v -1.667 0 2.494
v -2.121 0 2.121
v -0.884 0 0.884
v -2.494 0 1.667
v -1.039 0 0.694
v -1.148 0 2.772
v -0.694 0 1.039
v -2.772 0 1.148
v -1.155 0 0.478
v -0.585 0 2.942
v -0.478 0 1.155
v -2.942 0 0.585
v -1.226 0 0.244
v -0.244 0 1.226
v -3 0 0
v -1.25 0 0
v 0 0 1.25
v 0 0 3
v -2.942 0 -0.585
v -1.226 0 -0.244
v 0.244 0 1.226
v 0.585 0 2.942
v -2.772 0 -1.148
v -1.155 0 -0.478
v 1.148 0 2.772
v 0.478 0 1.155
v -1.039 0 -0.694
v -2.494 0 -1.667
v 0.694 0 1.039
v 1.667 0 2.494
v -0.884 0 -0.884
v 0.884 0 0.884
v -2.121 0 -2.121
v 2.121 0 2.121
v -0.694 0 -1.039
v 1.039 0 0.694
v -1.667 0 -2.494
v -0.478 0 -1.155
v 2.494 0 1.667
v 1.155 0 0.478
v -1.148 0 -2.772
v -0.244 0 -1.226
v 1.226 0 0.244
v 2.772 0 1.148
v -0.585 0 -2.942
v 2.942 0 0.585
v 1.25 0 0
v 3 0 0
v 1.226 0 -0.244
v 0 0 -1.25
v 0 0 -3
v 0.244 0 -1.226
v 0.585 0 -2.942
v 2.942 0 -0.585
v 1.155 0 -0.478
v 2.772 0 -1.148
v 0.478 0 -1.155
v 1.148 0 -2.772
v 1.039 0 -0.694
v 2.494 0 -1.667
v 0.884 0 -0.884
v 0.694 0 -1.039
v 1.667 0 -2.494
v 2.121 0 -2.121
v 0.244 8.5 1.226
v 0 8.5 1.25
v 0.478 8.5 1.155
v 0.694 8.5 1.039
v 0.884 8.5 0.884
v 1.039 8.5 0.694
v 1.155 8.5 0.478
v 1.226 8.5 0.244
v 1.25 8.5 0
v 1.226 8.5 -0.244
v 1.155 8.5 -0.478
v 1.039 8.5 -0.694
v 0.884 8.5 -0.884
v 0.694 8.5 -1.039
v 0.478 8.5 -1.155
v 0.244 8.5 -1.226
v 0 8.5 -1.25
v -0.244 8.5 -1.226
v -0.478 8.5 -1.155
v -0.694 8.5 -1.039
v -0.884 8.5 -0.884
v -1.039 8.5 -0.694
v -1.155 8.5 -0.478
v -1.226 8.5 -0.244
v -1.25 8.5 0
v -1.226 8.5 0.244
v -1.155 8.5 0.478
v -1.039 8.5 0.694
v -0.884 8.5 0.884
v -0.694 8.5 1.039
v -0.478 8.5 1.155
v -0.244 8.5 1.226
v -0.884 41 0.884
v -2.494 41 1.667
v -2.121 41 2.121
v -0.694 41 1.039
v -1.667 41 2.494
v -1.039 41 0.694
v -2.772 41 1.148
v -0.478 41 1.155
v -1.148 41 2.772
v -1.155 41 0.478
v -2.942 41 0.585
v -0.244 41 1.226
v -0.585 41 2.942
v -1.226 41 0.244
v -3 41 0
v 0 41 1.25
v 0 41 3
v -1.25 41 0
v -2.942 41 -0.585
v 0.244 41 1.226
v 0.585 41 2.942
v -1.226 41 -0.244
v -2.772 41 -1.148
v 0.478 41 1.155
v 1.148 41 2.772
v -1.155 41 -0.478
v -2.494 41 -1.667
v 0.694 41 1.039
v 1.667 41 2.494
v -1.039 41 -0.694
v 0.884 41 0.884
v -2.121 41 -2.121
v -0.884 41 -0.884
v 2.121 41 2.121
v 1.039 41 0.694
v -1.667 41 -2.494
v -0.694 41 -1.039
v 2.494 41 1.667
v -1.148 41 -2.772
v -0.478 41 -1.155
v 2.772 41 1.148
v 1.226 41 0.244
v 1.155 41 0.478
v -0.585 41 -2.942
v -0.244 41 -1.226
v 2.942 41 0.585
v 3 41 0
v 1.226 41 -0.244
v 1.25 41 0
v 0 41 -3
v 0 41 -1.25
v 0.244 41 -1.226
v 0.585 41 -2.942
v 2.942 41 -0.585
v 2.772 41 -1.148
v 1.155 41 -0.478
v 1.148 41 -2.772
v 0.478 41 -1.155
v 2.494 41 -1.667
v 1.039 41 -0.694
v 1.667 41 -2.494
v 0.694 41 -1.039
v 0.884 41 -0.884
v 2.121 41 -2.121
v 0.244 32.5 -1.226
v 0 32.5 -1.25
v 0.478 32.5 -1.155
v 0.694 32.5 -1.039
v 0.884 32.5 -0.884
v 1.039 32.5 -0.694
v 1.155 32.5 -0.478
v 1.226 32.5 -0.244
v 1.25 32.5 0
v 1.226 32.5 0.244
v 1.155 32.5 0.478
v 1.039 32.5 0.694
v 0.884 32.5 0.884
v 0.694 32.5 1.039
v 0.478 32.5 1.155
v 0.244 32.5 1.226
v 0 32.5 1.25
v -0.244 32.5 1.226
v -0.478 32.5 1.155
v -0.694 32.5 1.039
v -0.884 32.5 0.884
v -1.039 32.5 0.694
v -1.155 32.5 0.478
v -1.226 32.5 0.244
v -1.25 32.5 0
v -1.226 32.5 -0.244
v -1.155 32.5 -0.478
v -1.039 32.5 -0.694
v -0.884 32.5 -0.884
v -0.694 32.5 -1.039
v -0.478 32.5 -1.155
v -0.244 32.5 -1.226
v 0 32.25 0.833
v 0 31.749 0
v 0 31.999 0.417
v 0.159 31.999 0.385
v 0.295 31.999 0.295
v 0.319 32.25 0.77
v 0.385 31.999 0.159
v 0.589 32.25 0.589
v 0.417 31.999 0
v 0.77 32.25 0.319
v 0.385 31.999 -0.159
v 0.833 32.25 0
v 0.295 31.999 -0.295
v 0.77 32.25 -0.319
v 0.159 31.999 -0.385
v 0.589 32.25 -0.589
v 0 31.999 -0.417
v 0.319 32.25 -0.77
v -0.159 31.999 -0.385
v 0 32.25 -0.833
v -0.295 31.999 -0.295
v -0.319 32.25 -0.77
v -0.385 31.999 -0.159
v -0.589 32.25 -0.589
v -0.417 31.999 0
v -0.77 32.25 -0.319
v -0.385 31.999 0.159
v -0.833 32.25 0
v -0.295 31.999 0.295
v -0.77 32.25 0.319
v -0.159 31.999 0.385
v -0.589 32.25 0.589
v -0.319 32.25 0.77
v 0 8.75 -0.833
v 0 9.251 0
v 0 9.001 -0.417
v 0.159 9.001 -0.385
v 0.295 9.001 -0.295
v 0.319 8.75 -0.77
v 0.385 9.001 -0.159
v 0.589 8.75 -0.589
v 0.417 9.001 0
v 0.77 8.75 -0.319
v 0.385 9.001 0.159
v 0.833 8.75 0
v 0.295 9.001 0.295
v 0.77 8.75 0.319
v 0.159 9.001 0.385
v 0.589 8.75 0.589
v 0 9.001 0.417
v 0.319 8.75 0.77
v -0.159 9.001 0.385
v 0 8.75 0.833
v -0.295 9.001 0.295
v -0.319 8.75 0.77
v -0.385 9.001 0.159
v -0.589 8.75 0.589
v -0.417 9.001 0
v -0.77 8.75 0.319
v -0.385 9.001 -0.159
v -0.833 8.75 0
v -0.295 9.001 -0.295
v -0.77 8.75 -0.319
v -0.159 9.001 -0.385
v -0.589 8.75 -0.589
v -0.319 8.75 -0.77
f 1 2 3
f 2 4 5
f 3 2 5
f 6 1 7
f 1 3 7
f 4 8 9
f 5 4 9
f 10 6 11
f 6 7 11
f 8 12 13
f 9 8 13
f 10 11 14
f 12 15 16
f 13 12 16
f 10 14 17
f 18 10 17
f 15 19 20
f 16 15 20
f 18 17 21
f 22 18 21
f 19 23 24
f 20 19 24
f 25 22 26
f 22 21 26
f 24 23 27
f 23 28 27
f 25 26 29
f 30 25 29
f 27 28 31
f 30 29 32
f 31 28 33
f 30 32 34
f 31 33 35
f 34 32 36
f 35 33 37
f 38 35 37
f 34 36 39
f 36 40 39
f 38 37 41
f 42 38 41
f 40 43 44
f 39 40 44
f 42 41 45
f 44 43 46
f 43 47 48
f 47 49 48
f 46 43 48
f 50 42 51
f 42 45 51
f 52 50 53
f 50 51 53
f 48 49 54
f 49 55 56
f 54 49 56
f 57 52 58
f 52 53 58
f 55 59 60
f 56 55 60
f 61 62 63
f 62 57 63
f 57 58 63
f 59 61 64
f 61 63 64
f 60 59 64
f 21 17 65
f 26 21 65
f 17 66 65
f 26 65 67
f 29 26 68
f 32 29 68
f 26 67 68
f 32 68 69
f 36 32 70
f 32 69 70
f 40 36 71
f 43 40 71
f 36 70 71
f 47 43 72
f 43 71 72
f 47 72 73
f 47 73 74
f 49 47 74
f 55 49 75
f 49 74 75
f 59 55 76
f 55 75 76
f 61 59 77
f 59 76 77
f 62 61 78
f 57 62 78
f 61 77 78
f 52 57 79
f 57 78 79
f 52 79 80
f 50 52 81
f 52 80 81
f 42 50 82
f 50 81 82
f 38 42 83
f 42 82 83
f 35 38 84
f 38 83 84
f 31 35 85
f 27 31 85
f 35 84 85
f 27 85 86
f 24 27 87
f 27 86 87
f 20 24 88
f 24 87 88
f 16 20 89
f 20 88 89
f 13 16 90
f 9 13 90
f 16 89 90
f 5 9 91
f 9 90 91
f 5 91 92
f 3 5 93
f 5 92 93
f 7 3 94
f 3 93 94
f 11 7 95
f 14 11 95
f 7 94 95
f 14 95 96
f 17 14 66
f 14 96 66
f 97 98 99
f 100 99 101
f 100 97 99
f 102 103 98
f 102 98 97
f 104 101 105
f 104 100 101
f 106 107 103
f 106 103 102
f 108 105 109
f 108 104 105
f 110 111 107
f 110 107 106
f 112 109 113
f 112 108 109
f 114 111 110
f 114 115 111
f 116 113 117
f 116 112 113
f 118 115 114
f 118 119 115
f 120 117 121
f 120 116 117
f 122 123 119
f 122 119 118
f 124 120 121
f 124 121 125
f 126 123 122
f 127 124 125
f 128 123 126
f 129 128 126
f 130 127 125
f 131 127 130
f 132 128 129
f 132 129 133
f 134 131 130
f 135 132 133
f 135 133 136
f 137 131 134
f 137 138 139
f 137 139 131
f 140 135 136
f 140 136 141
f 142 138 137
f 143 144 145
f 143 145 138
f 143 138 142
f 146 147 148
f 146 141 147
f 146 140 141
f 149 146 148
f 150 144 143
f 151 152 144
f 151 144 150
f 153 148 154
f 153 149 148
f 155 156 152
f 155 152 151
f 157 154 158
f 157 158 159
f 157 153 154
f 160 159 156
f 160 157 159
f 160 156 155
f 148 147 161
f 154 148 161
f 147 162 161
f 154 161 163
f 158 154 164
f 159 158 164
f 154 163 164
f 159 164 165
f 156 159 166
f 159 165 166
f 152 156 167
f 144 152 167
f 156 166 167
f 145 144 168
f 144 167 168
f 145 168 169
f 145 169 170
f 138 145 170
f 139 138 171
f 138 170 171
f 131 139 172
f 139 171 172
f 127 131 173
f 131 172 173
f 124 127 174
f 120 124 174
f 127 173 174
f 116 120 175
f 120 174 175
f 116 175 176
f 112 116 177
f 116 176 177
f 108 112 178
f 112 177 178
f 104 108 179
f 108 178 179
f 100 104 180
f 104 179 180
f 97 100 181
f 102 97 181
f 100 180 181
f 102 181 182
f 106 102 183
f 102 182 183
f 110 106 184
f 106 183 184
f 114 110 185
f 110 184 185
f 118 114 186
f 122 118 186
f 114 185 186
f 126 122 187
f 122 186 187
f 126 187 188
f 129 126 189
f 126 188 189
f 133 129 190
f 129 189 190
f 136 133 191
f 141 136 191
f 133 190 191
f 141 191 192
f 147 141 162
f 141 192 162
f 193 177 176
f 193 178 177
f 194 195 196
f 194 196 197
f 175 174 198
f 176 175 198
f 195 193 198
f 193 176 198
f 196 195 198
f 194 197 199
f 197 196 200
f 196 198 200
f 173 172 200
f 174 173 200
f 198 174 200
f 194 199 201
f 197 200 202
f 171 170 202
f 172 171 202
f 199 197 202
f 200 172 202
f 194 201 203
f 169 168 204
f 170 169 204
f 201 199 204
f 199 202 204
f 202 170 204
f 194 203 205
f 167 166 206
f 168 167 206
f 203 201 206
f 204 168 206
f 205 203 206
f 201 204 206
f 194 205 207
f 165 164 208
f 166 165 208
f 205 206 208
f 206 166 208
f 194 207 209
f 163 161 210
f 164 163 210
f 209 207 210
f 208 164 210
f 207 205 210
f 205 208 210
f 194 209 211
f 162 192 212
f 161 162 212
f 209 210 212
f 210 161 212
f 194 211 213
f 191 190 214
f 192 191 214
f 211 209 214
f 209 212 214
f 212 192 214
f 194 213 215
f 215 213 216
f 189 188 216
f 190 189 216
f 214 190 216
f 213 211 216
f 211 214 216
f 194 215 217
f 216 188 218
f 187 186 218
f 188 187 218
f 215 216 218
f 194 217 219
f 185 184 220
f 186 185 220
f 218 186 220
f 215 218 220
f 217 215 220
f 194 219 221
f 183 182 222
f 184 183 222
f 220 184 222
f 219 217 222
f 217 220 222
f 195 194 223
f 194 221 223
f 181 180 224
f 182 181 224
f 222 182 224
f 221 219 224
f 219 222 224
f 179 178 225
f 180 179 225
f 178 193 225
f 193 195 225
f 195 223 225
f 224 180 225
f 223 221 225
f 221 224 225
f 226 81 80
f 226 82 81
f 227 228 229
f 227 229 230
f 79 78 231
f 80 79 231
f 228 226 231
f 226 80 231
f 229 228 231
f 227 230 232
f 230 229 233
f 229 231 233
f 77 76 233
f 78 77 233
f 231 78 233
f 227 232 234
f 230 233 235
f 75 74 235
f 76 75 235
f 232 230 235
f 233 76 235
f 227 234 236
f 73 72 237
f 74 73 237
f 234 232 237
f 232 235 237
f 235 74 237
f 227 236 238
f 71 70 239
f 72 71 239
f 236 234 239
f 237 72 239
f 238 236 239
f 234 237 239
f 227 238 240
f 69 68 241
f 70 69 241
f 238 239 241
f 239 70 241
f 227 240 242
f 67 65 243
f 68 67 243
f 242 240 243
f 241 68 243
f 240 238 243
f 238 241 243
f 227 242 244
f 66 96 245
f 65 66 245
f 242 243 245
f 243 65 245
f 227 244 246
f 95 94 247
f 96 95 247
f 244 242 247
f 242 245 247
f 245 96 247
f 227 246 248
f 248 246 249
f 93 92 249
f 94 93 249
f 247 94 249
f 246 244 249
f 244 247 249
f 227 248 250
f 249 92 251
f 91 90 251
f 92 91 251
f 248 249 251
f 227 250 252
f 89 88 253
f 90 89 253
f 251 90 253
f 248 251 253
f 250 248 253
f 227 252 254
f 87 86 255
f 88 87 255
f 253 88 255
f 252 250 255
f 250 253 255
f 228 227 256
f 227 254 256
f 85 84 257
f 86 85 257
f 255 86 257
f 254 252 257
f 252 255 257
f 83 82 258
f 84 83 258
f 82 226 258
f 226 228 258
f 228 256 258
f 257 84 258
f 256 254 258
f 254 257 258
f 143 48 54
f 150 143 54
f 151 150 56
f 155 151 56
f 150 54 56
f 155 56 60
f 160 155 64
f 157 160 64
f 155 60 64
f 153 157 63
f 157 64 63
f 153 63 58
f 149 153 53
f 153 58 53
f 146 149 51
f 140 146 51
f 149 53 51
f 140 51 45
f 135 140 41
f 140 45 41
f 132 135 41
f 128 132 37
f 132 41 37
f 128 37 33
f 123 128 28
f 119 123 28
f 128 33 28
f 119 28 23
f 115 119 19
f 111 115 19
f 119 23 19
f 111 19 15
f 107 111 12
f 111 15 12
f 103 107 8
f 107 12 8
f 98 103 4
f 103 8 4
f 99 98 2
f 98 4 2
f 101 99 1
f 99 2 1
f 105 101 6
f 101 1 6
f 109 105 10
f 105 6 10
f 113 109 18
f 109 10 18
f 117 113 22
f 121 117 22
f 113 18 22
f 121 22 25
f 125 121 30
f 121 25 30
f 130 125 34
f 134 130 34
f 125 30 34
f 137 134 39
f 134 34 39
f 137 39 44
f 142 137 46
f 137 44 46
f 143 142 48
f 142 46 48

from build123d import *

# Parameters (mm, degrees)
SKETCH_1_R             = 3
EXTRUDE_1_DEPTH        = 41
HOLE_WIZARD_M3_1_D     = 2.5
HOLE_WIZARD_M3_1_DEPTH = 8.5
HOLE_WIZARD_M3_1_TIP   = 0.751075774
HOLE_WIZARD_M3_2_D     = 2.5
HOLE_WIZARD_M3_2_DEPTH = 8.5
HOLE_WIZARD_M3_2_TIP   = 0.751075774


with BuildPart() as part:
    # 草图1 → 凸台-拉伸1 (new body)
    with BuildSketch(Plane(origin=(0, 0, 0), x_dir=(1, 0, 0), z_dir=(0, 1, 0))):
        Circle(SKETCH_1_R)
    extrude(amount=EXTRUDE_1_DEPTH)

    # M3 螺纹孔1
    with Locations(Plane.ZX.offset(41)):
        with Locations((0, 0)):
            Hole(HOLE_WIZARD_M3_1_D / 2, depth=HOLE_WIZARD_M3_1_DEPTH)
            with Locations((0, 0, -(HOLE_WIZARD_M3_1_DEPTH + HOLE_WIZARD_M3_1_TIP / 2))):  # 118° drill point
                Cone(0, HOLE_WIZARD_M3_1_D / 2, HOLE_WIZARD_M3_1_TIP, mode=Mode.SUBTRACT)

    # M3 螺纹孔2
    with Locations(Plane(origin=(0, 0, 0), x_dir=(0, 0, -1), z_dir=(0, -1, 0))):
        with Locations((0, 0)):
            Hole(HOLE_WIZARD_M3_2_D / 2, depth=HOLE_WIZARD_M3_2_DEPTH)
            with Locations((0, 0, -(HOLE_WIZARD_M3_2_DEPTH + HOLE_WIZARD_M3_2_TIP / 2))):  # 118° drill point
                Cone(0, HOLE_WIZARD_M3_2_D / 2, HOLE_WIZARD_M3_2_TIP, mode=Mode.SUBTRACT)


solid = part.part
